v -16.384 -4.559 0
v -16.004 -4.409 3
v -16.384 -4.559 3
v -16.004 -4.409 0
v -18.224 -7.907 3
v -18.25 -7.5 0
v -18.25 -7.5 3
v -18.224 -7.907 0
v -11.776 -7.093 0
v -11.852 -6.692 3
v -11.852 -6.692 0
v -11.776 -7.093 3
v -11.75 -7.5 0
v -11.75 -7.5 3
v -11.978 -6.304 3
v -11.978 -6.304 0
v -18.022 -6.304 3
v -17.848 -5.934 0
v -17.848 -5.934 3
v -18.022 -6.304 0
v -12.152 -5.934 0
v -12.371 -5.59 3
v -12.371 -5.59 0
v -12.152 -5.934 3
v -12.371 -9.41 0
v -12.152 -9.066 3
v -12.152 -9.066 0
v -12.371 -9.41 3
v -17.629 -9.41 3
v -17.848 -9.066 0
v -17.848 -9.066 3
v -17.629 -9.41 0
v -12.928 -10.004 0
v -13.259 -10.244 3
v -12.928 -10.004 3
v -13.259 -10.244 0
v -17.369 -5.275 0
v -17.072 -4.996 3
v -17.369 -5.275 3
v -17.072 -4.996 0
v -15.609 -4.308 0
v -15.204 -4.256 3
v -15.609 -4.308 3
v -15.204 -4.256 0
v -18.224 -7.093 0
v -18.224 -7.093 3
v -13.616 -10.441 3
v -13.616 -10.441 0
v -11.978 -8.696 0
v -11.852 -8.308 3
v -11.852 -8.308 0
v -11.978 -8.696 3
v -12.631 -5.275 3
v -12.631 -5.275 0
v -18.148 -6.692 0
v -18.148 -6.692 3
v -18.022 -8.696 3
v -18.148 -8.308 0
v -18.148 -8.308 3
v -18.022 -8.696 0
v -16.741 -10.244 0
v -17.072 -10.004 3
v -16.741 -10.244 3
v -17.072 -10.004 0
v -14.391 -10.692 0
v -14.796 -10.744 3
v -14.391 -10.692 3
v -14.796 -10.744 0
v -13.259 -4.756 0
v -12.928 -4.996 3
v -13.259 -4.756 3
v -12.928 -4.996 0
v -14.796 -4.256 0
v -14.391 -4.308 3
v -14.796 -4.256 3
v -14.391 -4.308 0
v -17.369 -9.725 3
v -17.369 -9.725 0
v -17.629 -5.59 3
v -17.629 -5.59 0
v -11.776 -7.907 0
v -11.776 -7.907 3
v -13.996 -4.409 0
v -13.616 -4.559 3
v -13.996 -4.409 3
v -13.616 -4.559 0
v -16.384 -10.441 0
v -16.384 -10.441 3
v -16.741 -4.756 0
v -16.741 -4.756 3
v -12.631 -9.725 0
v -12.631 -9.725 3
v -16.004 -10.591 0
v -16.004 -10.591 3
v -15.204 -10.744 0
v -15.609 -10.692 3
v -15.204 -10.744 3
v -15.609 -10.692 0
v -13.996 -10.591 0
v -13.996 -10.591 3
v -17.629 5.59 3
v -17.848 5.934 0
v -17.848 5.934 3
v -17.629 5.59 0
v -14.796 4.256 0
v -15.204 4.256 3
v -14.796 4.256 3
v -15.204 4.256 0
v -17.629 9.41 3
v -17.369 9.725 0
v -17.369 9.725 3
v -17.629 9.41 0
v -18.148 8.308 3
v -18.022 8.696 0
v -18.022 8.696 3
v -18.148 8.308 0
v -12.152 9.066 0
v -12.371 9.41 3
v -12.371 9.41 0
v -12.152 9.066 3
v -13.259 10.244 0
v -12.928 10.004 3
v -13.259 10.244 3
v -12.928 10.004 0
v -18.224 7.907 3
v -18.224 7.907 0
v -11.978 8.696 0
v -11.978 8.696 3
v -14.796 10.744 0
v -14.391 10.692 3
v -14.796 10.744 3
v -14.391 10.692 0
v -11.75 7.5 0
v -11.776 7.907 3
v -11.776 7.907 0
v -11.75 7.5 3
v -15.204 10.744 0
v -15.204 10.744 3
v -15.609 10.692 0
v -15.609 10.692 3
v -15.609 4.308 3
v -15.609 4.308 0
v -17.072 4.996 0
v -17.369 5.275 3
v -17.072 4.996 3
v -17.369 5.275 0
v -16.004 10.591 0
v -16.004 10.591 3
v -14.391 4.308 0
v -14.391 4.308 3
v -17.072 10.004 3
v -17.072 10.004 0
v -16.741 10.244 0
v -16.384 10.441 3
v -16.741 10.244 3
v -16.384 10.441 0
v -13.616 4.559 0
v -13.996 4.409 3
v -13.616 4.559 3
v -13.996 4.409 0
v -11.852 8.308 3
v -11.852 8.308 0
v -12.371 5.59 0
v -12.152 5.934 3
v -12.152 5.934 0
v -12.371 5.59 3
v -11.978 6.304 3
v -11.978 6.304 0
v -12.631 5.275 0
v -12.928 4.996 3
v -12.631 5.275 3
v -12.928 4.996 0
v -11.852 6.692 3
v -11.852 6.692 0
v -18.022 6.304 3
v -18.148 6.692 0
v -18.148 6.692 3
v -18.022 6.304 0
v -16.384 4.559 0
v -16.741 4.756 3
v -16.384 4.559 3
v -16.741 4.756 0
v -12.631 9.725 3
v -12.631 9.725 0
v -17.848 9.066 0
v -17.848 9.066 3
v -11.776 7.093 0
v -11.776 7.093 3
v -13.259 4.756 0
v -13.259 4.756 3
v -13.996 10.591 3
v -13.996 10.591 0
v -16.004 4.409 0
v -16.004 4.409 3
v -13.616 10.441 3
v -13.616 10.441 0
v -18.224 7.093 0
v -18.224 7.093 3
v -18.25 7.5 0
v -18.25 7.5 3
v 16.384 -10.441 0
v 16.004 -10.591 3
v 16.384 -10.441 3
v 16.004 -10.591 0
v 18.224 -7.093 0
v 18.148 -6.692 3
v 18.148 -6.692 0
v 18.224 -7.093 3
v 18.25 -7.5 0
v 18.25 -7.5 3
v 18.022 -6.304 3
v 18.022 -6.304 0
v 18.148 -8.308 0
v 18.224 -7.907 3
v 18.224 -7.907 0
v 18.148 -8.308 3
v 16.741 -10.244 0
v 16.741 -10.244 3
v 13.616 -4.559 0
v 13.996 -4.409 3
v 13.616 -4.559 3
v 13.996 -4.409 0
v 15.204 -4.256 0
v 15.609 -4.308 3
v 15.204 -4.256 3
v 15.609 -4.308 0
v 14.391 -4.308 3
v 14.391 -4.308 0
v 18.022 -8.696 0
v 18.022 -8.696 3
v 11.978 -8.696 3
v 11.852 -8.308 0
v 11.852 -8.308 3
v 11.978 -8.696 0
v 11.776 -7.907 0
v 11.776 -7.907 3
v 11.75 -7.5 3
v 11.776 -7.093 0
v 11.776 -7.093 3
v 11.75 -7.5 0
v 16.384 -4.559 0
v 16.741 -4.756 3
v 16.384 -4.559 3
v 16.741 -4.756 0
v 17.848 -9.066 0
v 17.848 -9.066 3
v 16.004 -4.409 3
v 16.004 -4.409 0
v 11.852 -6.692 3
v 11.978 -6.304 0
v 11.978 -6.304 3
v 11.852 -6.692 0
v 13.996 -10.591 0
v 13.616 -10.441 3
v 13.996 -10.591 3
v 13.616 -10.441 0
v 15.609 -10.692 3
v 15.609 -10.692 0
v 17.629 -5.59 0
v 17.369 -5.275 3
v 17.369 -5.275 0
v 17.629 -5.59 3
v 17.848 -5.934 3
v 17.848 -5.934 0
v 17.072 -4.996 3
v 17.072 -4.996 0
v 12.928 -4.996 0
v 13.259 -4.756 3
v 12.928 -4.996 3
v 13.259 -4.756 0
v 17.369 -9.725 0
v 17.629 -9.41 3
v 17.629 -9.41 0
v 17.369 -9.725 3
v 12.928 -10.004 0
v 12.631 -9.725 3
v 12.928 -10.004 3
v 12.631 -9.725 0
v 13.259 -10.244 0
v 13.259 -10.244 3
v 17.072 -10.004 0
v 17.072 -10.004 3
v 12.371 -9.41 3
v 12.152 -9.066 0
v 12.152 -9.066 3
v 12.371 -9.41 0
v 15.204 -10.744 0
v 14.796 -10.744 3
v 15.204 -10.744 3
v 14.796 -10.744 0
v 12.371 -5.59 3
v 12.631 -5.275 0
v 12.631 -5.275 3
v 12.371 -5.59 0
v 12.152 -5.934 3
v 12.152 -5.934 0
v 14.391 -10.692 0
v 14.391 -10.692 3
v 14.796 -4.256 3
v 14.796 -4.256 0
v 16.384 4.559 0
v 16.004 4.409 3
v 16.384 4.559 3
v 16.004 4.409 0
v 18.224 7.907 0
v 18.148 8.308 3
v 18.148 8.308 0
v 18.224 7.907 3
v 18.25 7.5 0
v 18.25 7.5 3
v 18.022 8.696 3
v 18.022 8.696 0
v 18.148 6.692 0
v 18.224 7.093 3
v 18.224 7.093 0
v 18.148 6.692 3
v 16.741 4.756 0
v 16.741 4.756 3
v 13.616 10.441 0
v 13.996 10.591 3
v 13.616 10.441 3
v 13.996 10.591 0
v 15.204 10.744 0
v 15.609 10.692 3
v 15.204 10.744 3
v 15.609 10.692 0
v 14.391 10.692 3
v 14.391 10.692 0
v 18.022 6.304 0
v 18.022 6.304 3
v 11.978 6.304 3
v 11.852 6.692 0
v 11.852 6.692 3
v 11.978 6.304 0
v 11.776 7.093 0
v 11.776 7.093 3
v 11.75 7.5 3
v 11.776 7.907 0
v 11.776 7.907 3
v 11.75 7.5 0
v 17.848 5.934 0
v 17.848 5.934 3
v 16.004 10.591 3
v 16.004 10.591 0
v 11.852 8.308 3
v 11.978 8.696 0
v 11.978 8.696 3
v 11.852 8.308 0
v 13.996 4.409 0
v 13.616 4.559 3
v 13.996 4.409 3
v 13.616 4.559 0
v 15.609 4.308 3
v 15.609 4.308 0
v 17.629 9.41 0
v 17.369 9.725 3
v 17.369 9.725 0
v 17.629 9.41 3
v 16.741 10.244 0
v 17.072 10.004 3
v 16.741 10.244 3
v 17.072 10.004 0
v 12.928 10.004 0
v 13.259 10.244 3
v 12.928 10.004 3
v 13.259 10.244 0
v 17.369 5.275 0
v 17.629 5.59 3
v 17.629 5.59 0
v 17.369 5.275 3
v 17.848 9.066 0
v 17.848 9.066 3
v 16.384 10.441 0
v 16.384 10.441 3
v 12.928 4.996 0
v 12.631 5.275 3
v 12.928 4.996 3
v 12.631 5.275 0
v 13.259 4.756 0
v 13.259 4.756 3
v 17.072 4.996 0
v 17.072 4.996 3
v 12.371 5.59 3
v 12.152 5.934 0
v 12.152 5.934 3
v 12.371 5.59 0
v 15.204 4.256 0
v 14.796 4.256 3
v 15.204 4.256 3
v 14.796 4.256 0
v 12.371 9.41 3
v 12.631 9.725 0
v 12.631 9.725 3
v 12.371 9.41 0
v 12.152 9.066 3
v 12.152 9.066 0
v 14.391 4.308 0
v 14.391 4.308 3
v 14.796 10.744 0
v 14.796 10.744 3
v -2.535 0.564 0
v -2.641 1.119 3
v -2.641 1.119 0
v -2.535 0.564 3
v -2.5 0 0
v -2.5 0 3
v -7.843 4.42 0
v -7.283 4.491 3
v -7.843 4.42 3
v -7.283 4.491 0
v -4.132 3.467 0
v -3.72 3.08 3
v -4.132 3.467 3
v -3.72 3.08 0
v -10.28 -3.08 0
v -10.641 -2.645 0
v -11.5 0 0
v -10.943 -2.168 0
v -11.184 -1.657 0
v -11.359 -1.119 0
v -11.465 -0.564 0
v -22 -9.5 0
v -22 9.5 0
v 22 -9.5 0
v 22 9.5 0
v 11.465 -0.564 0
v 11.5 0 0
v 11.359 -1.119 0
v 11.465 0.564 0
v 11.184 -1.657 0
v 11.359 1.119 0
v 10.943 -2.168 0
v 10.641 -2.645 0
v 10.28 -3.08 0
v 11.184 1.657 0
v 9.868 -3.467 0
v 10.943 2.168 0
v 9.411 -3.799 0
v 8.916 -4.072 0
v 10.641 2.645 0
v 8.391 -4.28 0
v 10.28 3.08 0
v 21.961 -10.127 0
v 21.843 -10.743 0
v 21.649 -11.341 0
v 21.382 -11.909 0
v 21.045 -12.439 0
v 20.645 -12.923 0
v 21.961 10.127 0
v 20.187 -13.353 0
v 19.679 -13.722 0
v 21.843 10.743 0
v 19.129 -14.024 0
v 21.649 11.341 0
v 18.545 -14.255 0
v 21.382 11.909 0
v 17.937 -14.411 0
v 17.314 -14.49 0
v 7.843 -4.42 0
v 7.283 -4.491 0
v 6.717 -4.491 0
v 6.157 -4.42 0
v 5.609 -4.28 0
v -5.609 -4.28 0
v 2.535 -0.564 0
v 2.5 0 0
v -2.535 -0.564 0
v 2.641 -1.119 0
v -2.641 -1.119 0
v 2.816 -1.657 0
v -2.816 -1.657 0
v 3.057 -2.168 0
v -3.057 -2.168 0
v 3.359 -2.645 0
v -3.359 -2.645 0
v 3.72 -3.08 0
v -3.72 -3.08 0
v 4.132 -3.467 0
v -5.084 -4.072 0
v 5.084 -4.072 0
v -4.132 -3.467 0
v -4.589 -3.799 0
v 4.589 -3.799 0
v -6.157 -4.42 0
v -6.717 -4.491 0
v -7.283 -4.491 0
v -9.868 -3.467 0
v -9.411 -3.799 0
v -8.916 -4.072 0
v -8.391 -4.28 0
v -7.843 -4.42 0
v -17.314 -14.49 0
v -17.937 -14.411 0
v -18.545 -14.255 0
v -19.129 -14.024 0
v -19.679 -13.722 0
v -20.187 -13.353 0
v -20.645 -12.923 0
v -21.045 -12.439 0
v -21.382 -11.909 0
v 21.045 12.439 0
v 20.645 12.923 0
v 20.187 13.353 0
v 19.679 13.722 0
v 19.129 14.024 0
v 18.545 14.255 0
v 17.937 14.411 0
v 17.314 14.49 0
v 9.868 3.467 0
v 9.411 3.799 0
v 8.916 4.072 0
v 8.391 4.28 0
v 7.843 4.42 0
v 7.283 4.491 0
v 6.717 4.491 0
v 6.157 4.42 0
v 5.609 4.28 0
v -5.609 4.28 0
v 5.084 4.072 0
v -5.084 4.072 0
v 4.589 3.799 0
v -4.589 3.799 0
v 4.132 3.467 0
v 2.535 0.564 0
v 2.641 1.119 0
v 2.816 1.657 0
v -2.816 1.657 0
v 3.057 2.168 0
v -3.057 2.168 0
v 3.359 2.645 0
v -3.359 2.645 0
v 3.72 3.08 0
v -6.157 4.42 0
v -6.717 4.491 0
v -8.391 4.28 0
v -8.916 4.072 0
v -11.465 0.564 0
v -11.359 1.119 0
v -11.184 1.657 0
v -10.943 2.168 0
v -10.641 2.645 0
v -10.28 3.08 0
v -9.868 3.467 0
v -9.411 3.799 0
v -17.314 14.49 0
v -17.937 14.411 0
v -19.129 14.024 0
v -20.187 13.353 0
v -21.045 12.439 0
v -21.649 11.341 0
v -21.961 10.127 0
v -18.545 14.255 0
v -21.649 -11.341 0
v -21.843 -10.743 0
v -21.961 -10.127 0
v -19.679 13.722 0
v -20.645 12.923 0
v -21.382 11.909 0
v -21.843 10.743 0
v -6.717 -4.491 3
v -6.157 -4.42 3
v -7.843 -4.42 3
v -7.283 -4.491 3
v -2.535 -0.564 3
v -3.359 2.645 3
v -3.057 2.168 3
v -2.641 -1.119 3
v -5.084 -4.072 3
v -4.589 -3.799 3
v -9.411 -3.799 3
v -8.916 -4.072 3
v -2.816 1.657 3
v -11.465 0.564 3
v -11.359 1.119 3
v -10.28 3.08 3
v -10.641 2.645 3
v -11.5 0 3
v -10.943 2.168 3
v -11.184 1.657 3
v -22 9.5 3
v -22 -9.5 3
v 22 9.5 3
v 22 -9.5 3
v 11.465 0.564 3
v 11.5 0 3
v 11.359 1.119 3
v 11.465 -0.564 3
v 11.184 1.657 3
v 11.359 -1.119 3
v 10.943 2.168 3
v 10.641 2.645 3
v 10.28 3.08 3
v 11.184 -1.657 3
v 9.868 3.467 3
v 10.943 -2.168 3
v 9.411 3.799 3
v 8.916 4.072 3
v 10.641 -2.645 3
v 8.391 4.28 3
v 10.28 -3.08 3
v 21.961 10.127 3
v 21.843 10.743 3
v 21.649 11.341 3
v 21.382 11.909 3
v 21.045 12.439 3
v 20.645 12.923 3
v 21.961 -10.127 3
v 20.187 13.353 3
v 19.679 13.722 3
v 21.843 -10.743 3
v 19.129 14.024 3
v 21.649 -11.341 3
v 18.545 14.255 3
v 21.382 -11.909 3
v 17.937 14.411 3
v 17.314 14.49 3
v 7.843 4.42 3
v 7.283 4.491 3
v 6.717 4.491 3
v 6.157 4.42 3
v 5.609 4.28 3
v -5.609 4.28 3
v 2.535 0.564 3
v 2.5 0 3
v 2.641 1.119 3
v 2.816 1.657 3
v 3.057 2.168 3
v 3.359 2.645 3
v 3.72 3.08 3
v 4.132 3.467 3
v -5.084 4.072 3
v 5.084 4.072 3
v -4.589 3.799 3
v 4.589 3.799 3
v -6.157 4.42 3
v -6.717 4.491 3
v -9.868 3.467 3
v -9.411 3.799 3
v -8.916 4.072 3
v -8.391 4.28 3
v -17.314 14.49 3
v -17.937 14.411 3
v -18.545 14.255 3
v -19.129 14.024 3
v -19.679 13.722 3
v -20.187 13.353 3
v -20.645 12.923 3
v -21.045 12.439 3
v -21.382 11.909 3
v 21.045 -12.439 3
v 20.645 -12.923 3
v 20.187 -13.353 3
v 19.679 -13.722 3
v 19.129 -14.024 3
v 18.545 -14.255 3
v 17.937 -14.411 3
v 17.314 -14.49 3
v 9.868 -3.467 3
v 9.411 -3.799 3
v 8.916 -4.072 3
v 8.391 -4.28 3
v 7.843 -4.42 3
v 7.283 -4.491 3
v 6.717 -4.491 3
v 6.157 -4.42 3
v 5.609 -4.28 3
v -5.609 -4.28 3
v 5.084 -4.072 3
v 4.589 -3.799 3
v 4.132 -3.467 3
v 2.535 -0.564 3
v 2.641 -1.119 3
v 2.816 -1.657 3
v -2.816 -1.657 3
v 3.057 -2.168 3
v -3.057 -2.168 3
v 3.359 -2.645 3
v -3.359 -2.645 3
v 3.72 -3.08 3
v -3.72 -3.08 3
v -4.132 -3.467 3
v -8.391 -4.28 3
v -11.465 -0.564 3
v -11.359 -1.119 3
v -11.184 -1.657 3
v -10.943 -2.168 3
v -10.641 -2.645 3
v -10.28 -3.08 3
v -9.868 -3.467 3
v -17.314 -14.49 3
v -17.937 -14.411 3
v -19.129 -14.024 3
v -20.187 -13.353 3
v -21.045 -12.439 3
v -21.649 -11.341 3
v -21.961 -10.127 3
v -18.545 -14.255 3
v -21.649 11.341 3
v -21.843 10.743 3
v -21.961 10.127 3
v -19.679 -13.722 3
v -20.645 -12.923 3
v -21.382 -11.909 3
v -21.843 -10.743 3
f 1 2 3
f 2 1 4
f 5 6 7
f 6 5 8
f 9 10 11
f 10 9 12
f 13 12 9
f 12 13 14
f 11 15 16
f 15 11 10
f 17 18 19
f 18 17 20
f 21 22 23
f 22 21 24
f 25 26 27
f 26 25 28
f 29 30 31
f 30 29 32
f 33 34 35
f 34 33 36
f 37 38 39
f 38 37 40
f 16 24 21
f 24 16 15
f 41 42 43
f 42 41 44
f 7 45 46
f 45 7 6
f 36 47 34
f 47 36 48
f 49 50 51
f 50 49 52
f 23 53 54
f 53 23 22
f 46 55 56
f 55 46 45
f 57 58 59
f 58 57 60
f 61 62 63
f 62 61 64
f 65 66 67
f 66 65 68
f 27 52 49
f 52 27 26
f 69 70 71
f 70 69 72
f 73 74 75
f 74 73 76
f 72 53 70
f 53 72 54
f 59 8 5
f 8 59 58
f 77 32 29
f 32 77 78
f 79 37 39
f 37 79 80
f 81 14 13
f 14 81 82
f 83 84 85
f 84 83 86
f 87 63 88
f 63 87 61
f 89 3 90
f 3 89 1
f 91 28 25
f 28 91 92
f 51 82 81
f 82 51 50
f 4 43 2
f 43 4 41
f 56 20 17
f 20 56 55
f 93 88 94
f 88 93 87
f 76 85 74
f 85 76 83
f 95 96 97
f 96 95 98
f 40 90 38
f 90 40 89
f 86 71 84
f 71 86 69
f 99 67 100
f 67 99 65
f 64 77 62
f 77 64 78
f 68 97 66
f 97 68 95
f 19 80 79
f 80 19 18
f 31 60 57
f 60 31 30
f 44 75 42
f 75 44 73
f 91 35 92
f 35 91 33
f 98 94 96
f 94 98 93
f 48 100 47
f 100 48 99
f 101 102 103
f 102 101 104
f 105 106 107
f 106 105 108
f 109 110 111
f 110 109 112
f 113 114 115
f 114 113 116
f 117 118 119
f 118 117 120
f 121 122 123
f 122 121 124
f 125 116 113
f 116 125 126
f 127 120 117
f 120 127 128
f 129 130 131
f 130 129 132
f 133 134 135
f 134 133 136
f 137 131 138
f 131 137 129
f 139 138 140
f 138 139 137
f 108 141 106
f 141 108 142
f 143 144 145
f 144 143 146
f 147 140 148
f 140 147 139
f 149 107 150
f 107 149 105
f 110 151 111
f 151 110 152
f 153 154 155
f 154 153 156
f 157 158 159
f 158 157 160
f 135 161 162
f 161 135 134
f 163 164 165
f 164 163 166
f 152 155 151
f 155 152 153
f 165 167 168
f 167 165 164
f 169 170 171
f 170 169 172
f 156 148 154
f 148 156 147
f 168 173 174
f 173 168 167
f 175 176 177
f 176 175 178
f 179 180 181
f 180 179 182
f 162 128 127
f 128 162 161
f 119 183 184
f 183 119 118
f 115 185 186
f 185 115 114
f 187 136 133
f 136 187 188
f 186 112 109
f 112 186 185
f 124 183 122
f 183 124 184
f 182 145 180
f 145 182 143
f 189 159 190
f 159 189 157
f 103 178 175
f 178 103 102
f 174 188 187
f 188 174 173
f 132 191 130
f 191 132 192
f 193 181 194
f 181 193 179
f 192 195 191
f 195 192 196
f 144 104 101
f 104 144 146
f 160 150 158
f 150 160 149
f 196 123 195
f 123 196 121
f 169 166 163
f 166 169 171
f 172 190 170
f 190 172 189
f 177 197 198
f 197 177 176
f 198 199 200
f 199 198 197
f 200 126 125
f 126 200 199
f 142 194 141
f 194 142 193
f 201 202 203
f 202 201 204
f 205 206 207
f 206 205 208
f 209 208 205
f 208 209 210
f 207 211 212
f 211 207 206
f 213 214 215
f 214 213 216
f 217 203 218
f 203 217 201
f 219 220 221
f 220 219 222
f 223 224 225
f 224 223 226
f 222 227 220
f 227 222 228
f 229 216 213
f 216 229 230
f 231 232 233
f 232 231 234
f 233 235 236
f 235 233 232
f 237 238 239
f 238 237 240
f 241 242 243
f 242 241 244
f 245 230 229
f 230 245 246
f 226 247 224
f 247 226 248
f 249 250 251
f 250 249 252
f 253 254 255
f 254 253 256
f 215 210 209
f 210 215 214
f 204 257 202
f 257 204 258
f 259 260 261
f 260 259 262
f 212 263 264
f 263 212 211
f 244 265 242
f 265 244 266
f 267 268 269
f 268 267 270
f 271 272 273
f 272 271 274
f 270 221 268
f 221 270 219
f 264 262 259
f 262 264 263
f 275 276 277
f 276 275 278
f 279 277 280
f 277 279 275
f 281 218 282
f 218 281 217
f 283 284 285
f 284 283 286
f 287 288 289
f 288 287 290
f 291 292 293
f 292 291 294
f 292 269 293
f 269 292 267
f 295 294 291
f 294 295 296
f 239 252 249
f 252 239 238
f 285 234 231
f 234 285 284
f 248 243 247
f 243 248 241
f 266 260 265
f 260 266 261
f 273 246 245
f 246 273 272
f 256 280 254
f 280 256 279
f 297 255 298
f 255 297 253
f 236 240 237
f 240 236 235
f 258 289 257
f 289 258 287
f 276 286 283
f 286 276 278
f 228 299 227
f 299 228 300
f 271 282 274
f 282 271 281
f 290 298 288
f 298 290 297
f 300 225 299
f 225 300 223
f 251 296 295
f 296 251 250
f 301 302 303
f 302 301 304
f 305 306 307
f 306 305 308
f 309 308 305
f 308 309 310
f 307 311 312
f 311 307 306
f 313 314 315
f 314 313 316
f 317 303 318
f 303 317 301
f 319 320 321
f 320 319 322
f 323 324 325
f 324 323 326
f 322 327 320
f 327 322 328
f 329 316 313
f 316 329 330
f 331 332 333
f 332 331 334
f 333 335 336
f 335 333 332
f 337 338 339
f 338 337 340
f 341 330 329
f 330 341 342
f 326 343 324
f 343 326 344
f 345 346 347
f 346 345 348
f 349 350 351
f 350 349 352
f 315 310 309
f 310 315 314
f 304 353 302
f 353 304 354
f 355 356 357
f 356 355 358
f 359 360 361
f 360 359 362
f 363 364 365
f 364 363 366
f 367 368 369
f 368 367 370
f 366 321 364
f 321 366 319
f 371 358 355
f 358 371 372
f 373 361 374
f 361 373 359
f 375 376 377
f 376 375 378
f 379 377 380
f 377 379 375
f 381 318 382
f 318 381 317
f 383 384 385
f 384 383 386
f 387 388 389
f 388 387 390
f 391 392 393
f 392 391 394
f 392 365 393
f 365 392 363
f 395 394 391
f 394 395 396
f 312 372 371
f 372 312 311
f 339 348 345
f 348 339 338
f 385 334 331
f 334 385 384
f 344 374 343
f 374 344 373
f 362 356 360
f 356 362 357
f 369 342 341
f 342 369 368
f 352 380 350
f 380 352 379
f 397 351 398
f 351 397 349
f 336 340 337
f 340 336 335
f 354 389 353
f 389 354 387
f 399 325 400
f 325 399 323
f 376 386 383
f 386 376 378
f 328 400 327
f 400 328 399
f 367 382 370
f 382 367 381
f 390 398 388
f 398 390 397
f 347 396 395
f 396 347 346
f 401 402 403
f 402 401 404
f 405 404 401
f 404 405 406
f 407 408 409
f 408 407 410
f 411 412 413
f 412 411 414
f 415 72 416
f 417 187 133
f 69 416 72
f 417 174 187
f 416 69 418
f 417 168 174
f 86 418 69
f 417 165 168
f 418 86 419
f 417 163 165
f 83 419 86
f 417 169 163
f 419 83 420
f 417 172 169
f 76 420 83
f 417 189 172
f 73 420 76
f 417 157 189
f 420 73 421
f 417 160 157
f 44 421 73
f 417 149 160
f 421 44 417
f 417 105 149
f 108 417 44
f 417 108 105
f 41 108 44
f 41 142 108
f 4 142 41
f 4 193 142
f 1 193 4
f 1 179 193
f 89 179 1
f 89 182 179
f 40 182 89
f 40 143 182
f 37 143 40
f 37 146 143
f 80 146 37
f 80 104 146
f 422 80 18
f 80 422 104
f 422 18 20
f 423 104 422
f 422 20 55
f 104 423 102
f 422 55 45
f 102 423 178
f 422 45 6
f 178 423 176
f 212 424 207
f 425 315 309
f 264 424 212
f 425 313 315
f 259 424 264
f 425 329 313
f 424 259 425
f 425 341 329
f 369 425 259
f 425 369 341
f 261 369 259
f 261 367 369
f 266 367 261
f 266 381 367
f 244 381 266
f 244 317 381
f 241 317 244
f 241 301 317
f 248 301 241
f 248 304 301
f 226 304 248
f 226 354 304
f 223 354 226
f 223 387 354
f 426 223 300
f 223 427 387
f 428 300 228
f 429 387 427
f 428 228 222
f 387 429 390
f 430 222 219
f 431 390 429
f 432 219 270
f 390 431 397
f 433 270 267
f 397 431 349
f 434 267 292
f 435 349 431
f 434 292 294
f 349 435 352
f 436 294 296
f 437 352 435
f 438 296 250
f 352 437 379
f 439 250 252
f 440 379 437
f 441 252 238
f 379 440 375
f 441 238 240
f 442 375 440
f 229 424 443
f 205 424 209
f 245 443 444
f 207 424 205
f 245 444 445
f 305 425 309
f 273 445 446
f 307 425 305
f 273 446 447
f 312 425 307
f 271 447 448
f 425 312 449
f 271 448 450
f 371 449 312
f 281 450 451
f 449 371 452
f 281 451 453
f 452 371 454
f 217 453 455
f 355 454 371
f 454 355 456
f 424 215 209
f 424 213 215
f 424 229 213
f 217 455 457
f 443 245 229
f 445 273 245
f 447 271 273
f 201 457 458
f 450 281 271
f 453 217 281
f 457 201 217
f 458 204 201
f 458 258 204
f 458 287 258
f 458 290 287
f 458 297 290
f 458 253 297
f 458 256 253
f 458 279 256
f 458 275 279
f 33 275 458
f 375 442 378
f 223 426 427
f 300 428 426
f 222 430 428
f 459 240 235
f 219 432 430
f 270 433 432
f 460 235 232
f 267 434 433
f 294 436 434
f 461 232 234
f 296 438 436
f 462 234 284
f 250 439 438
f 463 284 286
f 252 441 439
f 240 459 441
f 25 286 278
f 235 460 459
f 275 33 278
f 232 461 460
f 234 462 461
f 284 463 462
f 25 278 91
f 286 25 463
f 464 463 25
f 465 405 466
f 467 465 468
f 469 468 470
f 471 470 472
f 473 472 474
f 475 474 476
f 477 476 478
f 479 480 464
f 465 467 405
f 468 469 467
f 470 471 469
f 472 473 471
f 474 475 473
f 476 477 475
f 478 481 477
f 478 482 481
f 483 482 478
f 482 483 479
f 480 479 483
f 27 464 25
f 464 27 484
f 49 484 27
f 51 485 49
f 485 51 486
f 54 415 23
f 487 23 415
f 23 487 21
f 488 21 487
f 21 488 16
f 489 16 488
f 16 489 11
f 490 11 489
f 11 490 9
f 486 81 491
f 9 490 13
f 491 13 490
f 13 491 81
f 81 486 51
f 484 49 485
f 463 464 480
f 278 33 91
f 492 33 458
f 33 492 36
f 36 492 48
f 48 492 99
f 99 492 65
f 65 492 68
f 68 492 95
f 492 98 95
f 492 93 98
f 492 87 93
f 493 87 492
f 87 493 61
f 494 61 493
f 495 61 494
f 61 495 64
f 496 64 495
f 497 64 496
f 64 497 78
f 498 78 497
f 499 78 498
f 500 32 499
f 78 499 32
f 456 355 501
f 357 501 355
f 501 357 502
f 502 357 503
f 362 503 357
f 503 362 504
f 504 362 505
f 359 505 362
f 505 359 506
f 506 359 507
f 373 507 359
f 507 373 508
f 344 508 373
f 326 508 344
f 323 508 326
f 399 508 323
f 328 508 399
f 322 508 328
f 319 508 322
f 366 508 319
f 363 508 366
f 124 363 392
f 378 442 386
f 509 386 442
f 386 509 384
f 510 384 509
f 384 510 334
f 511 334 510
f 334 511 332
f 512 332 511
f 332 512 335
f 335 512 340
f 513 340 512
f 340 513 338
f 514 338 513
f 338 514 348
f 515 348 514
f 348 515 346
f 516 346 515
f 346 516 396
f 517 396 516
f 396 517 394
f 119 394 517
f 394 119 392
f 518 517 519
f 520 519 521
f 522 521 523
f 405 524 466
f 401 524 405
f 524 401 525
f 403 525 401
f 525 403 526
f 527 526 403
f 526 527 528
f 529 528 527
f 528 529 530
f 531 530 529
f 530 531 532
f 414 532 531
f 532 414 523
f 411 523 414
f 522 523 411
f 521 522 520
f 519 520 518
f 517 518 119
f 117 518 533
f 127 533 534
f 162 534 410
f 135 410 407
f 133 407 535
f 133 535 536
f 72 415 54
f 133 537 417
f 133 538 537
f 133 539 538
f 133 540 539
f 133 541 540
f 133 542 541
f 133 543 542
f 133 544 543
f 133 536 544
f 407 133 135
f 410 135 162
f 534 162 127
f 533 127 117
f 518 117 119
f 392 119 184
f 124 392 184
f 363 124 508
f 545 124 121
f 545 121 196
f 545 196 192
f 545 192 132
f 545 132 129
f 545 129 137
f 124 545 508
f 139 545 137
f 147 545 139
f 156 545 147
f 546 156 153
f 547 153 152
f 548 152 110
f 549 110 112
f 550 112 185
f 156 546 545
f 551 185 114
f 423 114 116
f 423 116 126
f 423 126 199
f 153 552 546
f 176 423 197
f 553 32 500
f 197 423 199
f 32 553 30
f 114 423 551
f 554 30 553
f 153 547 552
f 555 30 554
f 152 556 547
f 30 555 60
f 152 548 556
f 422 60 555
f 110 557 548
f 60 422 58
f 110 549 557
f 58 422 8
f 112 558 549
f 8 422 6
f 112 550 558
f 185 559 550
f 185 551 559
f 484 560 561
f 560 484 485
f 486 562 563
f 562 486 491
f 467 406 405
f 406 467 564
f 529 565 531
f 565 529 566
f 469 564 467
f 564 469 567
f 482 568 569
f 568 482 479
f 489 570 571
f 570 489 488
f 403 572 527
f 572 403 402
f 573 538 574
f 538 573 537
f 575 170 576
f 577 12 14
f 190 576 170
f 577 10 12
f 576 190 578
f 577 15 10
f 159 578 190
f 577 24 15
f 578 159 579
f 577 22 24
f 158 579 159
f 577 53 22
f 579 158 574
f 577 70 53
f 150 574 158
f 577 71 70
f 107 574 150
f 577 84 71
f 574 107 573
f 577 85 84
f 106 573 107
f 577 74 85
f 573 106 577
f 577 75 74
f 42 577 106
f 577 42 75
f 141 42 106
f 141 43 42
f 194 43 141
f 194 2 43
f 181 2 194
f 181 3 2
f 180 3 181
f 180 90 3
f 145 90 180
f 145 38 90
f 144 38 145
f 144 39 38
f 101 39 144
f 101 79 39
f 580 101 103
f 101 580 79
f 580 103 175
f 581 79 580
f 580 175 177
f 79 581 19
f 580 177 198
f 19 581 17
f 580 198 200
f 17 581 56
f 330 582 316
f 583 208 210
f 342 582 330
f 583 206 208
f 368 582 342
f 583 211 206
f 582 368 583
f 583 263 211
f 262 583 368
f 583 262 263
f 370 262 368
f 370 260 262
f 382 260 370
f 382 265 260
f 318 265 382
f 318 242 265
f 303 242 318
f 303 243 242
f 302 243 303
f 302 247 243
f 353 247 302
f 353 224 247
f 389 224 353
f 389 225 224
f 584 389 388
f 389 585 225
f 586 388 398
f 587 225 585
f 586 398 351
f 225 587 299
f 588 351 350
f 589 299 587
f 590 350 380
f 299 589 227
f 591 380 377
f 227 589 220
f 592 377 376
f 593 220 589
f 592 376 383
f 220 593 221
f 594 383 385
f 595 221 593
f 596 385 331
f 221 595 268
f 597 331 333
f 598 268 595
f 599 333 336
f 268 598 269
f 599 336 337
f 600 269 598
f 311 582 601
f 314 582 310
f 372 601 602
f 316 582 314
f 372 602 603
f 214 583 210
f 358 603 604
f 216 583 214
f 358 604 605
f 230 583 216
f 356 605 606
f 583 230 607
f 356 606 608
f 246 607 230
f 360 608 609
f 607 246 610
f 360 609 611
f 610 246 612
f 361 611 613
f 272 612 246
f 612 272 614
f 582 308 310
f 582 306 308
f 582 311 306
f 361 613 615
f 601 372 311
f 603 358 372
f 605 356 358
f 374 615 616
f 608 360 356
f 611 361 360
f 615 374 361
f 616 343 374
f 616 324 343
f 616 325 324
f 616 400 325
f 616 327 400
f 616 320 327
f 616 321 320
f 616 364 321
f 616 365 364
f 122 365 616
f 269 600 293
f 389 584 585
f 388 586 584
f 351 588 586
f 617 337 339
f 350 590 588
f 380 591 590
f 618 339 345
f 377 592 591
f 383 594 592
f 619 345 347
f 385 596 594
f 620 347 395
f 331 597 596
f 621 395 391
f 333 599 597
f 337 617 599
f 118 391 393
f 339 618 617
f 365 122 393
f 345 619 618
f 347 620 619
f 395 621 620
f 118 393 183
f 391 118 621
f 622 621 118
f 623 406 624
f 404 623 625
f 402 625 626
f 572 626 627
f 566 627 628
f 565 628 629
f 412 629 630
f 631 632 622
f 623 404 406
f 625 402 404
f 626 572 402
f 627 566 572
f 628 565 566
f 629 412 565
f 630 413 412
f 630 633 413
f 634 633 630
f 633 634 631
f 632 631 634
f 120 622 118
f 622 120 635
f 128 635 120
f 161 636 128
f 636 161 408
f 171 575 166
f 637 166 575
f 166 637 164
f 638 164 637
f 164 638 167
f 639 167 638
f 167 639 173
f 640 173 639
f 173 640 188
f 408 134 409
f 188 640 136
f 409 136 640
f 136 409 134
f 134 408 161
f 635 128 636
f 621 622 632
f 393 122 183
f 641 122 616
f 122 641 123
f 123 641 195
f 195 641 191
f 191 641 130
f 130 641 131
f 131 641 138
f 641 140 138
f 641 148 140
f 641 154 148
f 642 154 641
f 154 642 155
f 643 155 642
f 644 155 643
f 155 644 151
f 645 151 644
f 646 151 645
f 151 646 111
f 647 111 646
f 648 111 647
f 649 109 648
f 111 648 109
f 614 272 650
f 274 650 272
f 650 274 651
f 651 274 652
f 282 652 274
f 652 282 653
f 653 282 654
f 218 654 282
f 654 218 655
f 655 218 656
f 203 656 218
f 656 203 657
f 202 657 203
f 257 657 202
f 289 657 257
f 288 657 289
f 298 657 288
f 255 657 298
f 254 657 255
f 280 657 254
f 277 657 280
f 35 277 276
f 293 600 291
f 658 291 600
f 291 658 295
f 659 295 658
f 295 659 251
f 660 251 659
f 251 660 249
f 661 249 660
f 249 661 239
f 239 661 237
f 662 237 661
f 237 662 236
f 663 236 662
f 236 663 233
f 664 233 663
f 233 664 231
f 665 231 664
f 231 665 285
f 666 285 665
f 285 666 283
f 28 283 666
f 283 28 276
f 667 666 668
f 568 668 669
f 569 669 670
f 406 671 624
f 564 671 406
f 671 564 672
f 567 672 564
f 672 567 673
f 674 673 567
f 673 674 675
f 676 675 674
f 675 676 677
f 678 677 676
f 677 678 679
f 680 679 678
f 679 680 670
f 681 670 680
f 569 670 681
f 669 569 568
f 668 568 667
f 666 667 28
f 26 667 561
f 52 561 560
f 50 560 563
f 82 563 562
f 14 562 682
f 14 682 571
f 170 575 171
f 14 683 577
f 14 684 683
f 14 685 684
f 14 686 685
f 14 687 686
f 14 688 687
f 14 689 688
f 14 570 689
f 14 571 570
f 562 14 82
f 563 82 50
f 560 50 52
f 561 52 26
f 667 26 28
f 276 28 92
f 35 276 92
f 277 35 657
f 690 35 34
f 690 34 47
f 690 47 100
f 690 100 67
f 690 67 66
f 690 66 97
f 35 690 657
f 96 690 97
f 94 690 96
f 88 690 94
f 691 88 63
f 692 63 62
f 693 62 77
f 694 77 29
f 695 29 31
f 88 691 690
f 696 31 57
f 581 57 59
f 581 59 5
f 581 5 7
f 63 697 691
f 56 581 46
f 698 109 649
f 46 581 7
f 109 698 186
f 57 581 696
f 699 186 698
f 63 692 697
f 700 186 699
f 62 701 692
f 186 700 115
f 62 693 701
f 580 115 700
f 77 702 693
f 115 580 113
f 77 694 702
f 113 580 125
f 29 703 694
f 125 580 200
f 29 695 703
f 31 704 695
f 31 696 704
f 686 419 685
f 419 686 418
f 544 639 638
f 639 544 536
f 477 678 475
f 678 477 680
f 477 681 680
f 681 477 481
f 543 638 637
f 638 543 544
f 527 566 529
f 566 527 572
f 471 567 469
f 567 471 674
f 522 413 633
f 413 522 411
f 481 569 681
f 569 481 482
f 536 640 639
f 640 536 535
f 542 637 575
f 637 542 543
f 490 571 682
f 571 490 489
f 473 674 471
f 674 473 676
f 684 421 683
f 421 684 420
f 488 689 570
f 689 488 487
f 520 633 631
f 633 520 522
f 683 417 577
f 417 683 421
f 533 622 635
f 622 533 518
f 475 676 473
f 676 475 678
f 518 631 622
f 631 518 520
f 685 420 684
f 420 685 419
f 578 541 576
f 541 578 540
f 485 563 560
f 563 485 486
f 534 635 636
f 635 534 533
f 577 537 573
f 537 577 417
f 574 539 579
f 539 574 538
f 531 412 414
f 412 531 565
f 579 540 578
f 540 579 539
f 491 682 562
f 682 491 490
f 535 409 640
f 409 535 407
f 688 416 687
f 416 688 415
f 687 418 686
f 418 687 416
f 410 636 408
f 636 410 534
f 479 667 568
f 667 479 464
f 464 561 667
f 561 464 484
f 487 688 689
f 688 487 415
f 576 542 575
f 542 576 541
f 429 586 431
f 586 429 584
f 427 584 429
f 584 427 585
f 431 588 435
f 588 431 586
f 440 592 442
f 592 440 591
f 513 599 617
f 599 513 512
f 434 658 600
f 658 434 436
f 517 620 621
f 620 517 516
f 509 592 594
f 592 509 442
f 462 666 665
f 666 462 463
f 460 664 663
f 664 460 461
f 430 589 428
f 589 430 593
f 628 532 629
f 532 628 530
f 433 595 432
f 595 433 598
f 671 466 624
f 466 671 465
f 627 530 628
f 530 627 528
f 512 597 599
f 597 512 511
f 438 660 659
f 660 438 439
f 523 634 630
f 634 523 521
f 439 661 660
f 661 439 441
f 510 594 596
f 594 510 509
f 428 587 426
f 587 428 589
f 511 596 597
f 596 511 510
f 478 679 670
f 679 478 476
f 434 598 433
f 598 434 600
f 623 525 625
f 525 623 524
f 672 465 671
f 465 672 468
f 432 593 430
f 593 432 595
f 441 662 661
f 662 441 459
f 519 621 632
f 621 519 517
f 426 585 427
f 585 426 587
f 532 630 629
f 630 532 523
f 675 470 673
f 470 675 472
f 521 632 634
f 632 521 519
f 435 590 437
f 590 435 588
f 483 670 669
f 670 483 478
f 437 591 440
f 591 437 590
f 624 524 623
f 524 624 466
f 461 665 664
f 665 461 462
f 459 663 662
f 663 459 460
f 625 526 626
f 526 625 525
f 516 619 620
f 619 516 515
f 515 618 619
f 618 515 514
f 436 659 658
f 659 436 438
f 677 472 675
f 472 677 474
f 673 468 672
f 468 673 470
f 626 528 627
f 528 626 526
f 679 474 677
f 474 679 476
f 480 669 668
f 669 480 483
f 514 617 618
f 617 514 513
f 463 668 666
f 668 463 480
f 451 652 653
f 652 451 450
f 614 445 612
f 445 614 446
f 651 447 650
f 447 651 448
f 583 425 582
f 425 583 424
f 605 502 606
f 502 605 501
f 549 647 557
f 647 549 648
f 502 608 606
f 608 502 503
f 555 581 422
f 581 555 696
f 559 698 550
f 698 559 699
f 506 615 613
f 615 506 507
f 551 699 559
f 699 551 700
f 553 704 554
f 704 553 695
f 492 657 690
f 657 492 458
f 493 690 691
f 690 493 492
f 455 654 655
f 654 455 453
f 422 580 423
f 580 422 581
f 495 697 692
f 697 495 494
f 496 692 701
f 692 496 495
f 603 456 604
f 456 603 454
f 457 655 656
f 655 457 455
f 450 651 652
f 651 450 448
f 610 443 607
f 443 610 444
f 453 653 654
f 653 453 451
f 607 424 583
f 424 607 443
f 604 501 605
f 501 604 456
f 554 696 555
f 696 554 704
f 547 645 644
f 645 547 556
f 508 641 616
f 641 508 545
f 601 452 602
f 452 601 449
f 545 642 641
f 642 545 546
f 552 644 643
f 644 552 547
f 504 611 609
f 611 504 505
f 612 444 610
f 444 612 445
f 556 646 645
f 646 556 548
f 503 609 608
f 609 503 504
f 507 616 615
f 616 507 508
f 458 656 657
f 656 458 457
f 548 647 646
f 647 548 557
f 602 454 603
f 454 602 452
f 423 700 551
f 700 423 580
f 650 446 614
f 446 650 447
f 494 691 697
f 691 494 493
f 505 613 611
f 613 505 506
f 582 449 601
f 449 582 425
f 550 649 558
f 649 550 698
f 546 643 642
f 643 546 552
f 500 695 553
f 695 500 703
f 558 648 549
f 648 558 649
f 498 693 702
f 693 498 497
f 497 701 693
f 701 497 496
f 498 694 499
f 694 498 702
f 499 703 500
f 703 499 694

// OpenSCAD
$fn = 50;


difference() {
	union() {
		hull() {
			translate(v = [-17.0000000000, 9.5000000000, 0]) {
				cylinder(h = 3, r = 5);
			}
			translate(v = [17.0000000000, 9.5000000000, 0]) {
				cylinder(h = 3, r = 5);
			}
			translate(v = [-17.0000000000, -9.5000000000, 0]) {
				cylinder(h = 3, r = 5);
			}
			translate(v = [17.0000000000, -9.5000000000, 0]) {
				cylinder(h = 3, r = 5);
			}
		}
	}
	union() {
		#translate(v = [-15.0000000000, -7.5000000000, -100.0000000000]) {
			cylinder(h = 200, r = 3.2500000000);
		}
		#translate(v = [-15.0000000000, 7.5000000000, -100.0000000000]) {
			cylinder(h = 200, r = 3.2500000000);
		}
		#translate(v = [15.0000000000, -7.5000000000, -100.0000000000]) {
			cylinder(h = 200, r = 3.2500000000);
		}
		#translate(v = [15.0000000000, 7.5000000000, -100.0000000000]) {
			cylinder(h = 200, r = 3.2500000000);
		}
		#translate(v = [-7.0000000000, 0, 0]) {
			cylinder(h = 3, r = 4.5000000000);
		}
		#translate(v = [7.0000000000, 0, 0]) {
			cylinder(h = 3, r = 4.5000000000);
		}
	}
}
